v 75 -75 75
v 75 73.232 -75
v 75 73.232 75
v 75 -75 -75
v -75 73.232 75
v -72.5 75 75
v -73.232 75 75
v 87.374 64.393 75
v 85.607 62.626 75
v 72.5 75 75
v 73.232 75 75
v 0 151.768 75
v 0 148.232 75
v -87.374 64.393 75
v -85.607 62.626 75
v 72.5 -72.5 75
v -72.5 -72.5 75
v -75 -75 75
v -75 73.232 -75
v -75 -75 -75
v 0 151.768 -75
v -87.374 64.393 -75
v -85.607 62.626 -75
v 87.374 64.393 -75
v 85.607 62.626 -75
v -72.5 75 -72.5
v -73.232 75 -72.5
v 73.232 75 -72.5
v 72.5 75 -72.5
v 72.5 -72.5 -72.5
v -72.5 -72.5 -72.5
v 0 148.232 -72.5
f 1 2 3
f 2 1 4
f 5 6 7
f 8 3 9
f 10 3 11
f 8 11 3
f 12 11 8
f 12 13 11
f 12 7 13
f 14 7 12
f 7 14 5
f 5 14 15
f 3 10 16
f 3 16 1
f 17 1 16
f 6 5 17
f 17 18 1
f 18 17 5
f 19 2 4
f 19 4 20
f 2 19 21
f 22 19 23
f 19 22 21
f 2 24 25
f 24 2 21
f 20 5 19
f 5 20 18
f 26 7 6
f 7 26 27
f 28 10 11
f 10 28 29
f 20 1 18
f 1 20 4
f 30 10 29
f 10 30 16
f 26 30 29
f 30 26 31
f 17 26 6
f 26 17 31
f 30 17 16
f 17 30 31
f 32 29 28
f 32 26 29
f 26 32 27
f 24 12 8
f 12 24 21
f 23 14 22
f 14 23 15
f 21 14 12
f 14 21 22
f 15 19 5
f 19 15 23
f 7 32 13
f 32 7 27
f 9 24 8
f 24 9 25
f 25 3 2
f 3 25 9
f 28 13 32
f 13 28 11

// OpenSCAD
house_width=150;
house_height=150;
house_depth=150;
roof=sqrt(house_width*house_width+house_height*house_height);
wall_thickness=2.5;
extra=15;

difference() {
    cube([house_width,house_height,house_depth],center=true);
    translate([0,wall_thickness,wall_thickness])
        cube([house_width-wall_thickness*2,house_height,house_depth],center=true);
}

// cube([10,10,10],center=true);

translate([0,house_height/2,0]) {
    translate([-house_width/4,house_height/4,0])
        rotate([0,0,45])
            translate([-extra/2,0,0])
                cube([roof/2+wall_thickness+extra,wall_thickness,house_depth],center=true);
    translate([house_width/4,house_height/4,0])
        rotate([0,0,-45])
            translate([extra/2,0,0])
                cube([roof/2+wall_thickness+extra,wall_thickness,house_depth],center=true);

    translate([0,0,-house_depth/2+wall_thickness/2])
        difference() {
            rotate([0,0,45])
                cube([roof/2,roof/2,wall_thickness],center=true);
            translate([0,-roof/2+roof/4,0])
                cube([roof,roof/2,wall_thickness*2],center=true);
        }
}

//cylinder (h=20,r=10);
// difference() {
//     cube([40,40,40]);
//     cube([37.5,37.5,37.5]);
// }

// translate([0,0,40])
//     cube([40,40,2.5]);
// translate([11,-17,0]){
//     rotate([0,0,45]) {
//         difference() {
//             cube([40,40,40]);
//             translate([2.5,2.5,0]) {
//                 cube([37.5,35,37.5]);
//             }
//         }
//         // translate([15,-20,0])
//         //     %cube([20,20,40]);
//     }
// }
